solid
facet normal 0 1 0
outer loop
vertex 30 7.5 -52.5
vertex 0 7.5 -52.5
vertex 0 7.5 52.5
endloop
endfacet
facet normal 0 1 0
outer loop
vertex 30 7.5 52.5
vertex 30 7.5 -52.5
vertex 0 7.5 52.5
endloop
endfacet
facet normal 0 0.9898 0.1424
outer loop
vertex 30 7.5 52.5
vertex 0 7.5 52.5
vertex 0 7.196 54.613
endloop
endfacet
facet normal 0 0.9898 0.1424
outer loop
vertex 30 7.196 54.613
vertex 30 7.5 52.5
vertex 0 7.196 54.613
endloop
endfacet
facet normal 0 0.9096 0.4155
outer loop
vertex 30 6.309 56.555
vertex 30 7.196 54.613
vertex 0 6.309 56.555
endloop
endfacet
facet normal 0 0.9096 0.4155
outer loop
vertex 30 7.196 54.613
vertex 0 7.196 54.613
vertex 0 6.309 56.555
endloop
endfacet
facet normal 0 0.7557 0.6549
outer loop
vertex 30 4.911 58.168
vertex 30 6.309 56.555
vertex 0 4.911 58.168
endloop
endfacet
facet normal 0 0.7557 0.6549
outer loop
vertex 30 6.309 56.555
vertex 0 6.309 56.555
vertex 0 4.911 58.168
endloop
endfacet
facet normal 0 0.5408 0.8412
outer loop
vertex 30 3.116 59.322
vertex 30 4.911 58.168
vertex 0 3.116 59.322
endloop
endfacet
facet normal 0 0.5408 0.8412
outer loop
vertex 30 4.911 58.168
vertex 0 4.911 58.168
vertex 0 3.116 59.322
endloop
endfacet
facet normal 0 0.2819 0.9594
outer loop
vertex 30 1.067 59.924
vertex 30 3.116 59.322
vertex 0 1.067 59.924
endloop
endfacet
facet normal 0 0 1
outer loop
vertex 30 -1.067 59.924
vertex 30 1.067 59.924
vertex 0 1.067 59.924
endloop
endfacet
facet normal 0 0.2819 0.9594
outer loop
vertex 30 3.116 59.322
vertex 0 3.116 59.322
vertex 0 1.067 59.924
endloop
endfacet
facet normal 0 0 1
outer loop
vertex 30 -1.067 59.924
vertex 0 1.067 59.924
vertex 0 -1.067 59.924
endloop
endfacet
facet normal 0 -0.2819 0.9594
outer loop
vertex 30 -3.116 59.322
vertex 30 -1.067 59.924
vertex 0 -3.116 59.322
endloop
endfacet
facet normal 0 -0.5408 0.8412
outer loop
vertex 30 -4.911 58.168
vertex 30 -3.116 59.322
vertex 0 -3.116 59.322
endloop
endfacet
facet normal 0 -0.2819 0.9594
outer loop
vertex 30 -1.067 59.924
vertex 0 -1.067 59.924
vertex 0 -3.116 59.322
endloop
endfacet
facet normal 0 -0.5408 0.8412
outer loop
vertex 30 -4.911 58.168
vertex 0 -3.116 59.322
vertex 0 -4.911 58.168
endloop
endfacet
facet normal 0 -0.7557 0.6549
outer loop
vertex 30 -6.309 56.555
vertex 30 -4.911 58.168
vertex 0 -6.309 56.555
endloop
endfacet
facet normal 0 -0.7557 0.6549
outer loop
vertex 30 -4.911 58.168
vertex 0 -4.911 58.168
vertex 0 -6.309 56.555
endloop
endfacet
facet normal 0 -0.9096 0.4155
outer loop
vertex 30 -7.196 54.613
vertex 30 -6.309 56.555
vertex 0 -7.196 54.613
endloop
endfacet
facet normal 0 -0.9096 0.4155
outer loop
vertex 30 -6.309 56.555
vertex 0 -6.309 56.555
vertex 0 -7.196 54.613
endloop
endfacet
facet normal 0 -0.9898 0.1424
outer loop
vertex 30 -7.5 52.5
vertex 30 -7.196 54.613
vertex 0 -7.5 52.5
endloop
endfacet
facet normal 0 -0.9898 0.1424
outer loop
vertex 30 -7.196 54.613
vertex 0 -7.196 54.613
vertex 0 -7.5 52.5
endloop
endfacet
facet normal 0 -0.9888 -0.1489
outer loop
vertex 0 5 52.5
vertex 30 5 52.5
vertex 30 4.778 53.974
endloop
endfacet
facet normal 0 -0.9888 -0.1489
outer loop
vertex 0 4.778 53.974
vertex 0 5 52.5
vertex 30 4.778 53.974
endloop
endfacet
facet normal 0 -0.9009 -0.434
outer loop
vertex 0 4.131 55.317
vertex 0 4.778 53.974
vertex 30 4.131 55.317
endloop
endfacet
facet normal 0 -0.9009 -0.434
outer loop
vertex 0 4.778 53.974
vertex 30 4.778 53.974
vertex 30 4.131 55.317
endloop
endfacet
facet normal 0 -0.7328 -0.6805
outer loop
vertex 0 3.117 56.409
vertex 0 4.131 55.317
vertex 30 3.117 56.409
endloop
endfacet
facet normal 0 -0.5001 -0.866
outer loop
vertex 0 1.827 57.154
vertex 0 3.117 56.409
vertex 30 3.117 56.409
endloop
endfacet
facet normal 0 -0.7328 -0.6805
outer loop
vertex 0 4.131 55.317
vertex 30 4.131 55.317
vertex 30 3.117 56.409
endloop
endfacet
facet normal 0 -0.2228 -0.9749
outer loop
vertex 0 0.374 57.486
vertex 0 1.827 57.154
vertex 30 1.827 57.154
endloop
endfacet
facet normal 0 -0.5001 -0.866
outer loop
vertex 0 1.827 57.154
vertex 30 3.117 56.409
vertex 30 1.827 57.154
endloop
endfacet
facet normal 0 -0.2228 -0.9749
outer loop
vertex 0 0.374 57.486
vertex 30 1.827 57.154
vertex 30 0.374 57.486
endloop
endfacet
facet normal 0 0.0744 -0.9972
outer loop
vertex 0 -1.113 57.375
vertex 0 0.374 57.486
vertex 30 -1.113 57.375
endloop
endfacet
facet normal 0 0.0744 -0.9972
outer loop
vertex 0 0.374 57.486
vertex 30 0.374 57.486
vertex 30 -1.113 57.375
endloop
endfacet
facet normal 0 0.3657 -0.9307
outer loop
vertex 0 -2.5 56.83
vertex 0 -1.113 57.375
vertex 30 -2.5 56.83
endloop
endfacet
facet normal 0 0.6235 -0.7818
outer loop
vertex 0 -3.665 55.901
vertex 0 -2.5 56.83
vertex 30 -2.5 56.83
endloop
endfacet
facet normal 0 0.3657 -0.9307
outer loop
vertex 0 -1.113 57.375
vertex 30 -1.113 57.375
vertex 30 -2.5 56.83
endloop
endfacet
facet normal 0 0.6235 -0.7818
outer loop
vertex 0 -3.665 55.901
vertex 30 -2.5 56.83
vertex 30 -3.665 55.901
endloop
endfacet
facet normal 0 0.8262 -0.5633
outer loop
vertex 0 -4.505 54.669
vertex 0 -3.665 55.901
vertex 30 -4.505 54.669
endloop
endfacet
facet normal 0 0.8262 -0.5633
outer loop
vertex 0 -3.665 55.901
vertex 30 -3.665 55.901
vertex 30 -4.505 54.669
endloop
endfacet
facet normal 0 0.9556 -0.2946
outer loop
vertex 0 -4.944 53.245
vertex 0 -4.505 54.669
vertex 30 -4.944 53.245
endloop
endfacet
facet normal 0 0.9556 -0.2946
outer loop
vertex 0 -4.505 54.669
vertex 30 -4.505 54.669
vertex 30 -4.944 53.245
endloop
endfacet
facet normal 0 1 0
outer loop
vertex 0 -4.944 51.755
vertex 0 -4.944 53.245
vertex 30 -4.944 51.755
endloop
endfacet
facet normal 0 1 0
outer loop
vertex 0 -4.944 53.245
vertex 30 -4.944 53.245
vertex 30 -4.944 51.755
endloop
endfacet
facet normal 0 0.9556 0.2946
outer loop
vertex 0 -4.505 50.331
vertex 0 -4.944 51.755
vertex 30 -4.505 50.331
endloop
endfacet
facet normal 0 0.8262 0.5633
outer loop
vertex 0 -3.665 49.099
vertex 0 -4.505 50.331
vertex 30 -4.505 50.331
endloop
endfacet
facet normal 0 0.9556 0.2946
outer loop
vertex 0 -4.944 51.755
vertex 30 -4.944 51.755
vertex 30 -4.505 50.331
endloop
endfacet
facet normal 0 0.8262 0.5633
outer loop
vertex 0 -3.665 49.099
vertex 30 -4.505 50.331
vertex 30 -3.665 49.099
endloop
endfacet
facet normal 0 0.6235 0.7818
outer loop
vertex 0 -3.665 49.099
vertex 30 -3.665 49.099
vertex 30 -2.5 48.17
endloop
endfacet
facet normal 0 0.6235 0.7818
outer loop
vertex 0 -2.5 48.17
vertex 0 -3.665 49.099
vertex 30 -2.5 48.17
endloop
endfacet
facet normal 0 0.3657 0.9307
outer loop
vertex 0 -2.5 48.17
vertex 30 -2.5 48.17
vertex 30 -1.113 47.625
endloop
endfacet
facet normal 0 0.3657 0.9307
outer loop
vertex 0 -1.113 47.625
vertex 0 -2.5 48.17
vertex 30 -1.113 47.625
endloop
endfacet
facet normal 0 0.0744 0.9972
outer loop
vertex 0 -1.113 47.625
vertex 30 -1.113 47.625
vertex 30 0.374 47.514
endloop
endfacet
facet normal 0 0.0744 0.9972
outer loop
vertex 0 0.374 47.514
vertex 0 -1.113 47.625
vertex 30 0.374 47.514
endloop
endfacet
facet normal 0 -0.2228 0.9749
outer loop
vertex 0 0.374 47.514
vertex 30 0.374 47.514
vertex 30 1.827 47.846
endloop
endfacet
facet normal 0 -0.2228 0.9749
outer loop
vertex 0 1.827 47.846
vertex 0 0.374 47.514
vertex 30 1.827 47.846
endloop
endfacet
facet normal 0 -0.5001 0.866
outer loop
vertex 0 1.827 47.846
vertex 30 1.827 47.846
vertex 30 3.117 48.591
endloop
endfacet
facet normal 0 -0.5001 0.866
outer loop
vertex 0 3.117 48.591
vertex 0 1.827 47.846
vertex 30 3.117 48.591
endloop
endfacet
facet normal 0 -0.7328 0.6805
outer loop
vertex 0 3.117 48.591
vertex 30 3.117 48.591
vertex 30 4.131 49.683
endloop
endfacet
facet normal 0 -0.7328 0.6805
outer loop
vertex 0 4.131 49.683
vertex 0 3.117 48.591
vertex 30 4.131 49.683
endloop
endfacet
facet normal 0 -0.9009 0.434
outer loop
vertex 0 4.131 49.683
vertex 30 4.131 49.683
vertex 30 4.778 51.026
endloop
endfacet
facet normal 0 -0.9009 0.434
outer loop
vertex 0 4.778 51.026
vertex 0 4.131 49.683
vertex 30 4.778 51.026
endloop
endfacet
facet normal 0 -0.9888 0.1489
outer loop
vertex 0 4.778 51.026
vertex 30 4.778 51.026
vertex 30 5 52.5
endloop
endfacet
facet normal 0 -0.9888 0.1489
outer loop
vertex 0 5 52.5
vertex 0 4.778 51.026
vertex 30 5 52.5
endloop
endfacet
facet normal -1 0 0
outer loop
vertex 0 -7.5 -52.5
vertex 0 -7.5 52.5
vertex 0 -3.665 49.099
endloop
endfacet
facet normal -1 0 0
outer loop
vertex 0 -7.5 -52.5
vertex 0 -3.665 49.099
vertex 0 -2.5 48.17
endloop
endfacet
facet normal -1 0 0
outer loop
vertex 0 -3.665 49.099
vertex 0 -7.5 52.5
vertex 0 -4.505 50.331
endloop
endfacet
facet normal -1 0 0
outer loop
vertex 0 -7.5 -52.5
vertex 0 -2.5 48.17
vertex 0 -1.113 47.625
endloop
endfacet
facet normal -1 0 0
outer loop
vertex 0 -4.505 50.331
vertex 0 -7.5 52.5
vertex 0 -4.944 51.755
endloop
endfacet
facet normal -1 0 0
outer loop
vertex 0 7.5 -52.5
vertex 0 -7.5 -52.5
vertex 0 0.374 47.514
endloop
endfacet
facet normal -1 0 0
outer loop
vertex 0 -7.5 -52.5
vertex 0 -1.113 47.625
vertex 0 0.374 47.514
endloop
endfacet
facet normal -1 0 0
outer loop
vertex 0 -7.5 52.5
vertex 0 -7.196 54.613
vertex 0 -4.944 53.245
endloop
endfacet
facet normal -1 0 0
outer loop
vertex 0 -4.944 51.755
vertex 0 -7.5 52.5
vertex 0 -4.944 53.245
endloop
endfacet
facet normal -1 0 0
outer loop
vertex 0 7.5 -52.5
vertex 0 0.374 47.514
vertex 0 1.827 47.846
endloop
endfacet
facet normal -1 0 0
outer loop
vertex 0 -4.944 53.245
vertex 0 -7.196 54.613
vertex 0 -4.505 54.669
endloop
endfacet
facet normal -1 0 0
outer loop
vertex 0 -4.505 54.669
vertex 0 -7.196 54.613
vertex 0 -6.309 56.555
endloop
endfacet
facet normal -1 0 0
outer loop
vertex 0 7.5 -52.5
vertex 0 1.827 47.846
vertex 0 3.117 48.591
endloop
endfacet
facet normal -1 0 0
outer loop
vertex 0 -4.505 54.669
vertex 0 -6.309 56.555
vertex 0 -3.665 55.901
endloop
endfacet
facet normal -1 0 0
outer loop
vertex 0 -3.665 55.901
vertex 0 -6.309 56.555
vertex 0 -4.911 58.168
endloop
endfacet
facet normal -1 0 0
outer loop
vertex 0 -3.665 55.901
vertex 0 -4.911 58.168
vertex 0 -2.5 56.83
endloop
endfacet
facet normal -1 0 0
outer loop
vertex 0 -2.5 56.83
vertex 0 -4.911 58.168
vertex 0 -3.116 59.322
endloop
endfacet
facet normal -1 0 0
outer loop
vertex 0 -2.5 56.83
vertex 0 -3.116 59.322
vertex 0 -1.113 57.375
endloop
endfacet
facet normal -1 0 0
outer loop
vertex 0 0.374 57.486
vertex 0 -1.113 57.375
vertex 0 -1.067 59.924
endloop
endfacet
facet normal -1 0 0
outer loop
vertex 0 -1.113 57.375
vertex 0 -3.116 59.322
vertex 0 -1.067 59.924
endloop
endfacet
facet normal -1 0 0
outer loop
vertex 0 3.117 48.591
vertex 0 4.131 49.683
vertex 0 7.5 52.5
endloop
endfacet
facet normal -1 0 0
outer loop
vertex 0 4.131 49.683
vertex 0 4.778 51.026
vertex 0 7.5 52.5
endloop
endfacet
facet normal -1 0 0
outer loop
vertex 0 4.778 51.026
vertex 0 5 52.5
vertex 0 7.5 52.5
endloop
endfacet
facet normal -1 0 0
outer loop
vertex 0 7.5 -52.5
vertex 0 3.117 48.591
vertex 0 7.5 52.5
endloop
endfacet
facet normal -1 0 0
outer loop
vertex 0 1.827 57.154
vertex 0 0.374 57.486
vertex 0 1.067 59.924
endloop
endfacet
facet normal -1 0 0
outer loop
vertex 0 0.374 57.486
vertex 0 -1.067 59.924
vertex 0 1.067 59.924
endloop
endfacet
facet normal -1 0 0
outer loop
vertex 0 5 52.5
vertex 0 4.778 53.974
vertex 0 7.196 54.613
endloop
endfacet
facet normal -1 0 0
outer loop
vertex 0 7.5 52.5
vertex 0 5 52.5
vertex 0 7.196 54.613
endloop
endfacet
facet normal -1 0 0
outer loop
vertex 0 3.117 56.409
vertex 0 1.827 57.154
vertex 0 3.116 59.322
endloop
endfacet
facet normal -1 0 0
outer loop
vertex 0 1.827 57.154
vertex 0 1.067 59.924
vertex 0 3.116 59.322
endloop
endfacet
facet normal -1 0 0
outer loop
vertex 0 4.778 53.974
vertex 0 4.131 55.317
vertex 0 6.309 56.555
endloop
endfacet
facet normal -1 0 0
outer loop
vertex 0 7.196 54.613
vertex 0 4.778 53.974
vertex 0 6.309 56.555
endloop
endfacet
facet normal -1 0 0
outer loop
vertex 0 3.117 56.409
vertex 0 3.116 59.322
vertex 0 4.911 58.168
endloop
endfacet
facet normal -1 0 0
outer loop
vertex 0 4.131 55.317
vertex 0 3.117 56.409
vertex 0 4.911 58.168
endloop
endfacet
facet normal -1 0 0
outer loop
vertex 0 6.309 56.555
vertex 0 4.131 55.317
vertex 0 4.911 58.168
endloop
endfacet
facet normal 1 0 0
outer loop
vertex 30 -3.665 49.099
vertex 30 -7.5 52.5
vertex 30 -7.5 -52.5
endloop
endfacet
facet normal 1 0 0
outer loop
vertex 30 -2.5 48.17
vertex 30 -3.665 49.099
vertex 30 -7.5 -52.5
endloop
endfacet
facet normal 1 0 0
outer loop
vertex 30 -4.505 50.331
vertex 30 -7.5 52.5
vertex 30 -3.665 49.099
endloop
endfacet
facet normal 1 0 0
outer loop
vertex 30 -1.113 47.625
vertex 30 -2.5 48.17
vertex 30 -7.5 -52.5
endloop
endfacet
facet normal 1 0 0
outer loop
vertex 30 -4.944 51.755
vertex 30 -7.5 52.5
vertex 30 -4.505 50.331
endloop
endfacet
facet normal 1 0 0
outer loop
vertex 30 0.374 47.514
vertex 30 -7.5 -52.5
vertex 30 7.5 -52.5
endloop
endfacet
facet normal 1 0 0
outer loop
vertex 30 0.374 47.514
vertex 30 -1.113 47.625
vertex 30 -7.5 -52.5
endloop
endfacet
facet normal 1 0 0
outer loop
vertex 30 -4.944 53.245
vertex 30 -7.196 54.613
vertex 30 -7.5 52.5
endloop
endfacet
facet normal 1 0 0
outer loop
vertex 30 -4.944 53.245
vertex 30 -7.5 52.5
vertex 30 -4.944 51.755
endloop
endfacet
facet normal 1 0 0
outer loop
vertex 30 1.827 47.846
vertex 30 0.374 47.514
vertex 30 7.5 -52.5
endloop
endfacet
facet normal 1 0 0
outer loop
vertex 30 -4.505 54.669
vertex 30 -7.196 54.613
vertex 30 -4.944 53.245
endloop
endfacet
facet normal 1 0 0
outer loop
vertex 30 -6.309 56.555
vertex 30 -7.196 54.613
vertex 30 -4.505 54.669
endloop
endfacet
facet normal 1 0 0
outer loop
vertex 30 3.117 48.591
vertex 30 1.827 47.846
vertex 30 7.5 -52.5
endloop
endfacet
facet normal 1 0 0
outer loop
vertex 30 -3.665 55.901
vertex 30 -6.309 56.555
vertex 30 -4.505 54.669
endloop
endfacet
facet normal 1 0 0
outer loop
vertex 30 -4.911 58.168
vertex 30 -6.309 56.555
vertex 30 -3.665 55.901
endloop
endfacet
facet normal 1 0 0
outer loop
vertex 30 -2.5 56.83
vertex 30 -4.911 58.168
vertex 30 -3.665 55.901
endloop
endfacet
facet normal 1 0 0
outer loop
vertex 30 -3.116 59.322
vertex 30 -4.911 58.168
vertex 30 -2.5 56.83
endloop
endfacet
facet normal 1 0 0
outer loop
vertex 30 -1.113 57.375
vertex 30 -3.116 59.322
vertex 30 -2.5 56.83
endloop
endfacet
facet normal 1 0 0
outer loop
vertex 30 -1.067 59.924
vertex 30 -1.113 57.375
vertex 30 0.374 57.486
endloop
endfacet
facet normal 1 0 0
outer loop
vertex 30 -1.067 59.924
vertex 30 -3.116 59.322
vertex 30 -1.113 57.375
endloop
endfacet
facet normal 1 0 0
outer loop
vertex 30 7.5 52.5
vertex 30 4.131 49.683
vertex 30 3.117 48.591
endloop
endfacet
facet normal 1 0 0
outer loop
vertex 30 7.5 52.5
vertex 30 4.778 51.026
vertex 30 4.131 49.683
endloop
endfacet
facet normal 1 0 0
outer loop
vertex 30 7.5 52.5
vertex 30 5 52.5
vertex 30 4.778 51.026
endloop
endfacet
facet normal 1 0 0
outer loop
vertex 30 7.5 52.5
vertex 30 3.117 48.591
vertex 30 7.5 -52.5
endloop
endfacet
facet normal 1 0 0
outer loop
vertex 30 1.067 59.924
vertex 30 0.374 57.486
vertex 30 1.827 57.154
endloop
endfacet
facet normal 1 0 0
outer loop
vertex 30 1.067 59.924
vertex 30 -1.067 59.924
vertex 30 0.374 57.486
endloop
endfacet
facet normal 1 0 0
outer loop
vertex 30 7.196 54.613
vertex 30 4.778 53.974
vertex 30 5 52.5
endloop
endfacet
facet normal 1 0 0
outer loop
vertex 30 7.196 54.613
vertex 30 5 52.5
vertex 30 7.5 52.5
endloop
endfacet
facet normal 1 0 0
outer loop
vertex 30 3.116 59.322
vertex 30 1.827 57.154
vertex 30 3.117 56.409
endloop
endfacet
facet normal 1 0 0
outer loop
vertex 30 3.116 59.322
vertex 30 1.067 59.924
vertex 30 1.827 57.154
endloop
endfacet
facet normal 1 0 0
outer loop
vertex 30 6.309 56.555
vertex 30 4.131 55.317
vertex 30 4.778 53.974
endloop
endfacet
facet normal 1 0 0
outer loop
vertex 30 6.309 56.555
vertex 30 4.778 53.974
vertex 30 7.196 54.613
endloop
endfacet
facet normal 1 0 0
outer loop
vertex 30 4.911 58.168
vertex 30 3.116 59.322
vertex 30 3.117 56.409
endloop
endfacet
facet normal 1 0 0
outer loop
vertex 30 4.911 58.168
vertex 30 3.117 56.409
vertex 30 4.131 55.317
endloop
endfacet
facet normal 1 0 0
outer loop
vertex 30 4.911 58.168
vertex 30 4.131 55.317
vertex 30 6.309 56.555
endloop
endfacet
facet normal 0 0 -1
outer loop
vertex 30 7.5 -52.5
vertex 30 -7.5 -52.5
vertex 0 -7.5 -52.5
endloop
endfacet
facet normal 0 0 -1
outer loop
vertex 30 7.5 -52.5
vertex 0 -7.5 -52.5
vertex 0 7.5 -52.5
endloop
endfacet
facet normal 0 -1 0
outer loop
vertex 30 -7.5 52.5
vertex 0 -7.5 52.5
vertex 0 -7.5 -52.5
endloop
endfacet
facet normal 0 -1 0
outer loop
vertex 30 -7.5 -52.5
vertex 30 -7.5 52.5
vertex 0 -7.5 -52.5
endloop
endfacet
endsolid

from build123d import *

# Parameters (mm, degrees)
F1_DEPTH = 30
F2_R     = 5
F3_DEPTH = 30.001


with BuildPart() as f1:
    # F0 (on Right) → F1 (new body)
    with BuildSketch(Plane.YZ):
        with BuildLine():
            ThreePointArc((7.5, 52.5), (0, 60), (-7.5, 52.5))
            Line((-7.5, 52.5), (7.5, 52.5))
        make_face()
        with BuildLine():
            ThreePointArc((7.5, 52.5), (0, 45), (-7.5, 52.5))
            Line((-7.5, 52.5), (-7.5, -52.5))
            Line((-7.5, -52.5), (7.5, -52.5))
            Line((7.5, -52.5), (7.5, 52.5))
        make_face()
        with BuildLine():
            Line((7.5, 52.5), (-7.5, 52.5))
            ThreePointArc((-7.5, 52.5), (0, 45), (7.5, 52.5))
        make_face()
    extrude(amount=F1_DEPTH)

    # F2 (on face) → F3 (cut, through all)
    with BuildSketch(Plane.YZ.offset(30)):
        with Locations((0, 52.5)):
            Circle(F2_R)
    extrude(amount=-F3_DEPTH, mode=Mode.SUBTRACT)


solid = f1.part
